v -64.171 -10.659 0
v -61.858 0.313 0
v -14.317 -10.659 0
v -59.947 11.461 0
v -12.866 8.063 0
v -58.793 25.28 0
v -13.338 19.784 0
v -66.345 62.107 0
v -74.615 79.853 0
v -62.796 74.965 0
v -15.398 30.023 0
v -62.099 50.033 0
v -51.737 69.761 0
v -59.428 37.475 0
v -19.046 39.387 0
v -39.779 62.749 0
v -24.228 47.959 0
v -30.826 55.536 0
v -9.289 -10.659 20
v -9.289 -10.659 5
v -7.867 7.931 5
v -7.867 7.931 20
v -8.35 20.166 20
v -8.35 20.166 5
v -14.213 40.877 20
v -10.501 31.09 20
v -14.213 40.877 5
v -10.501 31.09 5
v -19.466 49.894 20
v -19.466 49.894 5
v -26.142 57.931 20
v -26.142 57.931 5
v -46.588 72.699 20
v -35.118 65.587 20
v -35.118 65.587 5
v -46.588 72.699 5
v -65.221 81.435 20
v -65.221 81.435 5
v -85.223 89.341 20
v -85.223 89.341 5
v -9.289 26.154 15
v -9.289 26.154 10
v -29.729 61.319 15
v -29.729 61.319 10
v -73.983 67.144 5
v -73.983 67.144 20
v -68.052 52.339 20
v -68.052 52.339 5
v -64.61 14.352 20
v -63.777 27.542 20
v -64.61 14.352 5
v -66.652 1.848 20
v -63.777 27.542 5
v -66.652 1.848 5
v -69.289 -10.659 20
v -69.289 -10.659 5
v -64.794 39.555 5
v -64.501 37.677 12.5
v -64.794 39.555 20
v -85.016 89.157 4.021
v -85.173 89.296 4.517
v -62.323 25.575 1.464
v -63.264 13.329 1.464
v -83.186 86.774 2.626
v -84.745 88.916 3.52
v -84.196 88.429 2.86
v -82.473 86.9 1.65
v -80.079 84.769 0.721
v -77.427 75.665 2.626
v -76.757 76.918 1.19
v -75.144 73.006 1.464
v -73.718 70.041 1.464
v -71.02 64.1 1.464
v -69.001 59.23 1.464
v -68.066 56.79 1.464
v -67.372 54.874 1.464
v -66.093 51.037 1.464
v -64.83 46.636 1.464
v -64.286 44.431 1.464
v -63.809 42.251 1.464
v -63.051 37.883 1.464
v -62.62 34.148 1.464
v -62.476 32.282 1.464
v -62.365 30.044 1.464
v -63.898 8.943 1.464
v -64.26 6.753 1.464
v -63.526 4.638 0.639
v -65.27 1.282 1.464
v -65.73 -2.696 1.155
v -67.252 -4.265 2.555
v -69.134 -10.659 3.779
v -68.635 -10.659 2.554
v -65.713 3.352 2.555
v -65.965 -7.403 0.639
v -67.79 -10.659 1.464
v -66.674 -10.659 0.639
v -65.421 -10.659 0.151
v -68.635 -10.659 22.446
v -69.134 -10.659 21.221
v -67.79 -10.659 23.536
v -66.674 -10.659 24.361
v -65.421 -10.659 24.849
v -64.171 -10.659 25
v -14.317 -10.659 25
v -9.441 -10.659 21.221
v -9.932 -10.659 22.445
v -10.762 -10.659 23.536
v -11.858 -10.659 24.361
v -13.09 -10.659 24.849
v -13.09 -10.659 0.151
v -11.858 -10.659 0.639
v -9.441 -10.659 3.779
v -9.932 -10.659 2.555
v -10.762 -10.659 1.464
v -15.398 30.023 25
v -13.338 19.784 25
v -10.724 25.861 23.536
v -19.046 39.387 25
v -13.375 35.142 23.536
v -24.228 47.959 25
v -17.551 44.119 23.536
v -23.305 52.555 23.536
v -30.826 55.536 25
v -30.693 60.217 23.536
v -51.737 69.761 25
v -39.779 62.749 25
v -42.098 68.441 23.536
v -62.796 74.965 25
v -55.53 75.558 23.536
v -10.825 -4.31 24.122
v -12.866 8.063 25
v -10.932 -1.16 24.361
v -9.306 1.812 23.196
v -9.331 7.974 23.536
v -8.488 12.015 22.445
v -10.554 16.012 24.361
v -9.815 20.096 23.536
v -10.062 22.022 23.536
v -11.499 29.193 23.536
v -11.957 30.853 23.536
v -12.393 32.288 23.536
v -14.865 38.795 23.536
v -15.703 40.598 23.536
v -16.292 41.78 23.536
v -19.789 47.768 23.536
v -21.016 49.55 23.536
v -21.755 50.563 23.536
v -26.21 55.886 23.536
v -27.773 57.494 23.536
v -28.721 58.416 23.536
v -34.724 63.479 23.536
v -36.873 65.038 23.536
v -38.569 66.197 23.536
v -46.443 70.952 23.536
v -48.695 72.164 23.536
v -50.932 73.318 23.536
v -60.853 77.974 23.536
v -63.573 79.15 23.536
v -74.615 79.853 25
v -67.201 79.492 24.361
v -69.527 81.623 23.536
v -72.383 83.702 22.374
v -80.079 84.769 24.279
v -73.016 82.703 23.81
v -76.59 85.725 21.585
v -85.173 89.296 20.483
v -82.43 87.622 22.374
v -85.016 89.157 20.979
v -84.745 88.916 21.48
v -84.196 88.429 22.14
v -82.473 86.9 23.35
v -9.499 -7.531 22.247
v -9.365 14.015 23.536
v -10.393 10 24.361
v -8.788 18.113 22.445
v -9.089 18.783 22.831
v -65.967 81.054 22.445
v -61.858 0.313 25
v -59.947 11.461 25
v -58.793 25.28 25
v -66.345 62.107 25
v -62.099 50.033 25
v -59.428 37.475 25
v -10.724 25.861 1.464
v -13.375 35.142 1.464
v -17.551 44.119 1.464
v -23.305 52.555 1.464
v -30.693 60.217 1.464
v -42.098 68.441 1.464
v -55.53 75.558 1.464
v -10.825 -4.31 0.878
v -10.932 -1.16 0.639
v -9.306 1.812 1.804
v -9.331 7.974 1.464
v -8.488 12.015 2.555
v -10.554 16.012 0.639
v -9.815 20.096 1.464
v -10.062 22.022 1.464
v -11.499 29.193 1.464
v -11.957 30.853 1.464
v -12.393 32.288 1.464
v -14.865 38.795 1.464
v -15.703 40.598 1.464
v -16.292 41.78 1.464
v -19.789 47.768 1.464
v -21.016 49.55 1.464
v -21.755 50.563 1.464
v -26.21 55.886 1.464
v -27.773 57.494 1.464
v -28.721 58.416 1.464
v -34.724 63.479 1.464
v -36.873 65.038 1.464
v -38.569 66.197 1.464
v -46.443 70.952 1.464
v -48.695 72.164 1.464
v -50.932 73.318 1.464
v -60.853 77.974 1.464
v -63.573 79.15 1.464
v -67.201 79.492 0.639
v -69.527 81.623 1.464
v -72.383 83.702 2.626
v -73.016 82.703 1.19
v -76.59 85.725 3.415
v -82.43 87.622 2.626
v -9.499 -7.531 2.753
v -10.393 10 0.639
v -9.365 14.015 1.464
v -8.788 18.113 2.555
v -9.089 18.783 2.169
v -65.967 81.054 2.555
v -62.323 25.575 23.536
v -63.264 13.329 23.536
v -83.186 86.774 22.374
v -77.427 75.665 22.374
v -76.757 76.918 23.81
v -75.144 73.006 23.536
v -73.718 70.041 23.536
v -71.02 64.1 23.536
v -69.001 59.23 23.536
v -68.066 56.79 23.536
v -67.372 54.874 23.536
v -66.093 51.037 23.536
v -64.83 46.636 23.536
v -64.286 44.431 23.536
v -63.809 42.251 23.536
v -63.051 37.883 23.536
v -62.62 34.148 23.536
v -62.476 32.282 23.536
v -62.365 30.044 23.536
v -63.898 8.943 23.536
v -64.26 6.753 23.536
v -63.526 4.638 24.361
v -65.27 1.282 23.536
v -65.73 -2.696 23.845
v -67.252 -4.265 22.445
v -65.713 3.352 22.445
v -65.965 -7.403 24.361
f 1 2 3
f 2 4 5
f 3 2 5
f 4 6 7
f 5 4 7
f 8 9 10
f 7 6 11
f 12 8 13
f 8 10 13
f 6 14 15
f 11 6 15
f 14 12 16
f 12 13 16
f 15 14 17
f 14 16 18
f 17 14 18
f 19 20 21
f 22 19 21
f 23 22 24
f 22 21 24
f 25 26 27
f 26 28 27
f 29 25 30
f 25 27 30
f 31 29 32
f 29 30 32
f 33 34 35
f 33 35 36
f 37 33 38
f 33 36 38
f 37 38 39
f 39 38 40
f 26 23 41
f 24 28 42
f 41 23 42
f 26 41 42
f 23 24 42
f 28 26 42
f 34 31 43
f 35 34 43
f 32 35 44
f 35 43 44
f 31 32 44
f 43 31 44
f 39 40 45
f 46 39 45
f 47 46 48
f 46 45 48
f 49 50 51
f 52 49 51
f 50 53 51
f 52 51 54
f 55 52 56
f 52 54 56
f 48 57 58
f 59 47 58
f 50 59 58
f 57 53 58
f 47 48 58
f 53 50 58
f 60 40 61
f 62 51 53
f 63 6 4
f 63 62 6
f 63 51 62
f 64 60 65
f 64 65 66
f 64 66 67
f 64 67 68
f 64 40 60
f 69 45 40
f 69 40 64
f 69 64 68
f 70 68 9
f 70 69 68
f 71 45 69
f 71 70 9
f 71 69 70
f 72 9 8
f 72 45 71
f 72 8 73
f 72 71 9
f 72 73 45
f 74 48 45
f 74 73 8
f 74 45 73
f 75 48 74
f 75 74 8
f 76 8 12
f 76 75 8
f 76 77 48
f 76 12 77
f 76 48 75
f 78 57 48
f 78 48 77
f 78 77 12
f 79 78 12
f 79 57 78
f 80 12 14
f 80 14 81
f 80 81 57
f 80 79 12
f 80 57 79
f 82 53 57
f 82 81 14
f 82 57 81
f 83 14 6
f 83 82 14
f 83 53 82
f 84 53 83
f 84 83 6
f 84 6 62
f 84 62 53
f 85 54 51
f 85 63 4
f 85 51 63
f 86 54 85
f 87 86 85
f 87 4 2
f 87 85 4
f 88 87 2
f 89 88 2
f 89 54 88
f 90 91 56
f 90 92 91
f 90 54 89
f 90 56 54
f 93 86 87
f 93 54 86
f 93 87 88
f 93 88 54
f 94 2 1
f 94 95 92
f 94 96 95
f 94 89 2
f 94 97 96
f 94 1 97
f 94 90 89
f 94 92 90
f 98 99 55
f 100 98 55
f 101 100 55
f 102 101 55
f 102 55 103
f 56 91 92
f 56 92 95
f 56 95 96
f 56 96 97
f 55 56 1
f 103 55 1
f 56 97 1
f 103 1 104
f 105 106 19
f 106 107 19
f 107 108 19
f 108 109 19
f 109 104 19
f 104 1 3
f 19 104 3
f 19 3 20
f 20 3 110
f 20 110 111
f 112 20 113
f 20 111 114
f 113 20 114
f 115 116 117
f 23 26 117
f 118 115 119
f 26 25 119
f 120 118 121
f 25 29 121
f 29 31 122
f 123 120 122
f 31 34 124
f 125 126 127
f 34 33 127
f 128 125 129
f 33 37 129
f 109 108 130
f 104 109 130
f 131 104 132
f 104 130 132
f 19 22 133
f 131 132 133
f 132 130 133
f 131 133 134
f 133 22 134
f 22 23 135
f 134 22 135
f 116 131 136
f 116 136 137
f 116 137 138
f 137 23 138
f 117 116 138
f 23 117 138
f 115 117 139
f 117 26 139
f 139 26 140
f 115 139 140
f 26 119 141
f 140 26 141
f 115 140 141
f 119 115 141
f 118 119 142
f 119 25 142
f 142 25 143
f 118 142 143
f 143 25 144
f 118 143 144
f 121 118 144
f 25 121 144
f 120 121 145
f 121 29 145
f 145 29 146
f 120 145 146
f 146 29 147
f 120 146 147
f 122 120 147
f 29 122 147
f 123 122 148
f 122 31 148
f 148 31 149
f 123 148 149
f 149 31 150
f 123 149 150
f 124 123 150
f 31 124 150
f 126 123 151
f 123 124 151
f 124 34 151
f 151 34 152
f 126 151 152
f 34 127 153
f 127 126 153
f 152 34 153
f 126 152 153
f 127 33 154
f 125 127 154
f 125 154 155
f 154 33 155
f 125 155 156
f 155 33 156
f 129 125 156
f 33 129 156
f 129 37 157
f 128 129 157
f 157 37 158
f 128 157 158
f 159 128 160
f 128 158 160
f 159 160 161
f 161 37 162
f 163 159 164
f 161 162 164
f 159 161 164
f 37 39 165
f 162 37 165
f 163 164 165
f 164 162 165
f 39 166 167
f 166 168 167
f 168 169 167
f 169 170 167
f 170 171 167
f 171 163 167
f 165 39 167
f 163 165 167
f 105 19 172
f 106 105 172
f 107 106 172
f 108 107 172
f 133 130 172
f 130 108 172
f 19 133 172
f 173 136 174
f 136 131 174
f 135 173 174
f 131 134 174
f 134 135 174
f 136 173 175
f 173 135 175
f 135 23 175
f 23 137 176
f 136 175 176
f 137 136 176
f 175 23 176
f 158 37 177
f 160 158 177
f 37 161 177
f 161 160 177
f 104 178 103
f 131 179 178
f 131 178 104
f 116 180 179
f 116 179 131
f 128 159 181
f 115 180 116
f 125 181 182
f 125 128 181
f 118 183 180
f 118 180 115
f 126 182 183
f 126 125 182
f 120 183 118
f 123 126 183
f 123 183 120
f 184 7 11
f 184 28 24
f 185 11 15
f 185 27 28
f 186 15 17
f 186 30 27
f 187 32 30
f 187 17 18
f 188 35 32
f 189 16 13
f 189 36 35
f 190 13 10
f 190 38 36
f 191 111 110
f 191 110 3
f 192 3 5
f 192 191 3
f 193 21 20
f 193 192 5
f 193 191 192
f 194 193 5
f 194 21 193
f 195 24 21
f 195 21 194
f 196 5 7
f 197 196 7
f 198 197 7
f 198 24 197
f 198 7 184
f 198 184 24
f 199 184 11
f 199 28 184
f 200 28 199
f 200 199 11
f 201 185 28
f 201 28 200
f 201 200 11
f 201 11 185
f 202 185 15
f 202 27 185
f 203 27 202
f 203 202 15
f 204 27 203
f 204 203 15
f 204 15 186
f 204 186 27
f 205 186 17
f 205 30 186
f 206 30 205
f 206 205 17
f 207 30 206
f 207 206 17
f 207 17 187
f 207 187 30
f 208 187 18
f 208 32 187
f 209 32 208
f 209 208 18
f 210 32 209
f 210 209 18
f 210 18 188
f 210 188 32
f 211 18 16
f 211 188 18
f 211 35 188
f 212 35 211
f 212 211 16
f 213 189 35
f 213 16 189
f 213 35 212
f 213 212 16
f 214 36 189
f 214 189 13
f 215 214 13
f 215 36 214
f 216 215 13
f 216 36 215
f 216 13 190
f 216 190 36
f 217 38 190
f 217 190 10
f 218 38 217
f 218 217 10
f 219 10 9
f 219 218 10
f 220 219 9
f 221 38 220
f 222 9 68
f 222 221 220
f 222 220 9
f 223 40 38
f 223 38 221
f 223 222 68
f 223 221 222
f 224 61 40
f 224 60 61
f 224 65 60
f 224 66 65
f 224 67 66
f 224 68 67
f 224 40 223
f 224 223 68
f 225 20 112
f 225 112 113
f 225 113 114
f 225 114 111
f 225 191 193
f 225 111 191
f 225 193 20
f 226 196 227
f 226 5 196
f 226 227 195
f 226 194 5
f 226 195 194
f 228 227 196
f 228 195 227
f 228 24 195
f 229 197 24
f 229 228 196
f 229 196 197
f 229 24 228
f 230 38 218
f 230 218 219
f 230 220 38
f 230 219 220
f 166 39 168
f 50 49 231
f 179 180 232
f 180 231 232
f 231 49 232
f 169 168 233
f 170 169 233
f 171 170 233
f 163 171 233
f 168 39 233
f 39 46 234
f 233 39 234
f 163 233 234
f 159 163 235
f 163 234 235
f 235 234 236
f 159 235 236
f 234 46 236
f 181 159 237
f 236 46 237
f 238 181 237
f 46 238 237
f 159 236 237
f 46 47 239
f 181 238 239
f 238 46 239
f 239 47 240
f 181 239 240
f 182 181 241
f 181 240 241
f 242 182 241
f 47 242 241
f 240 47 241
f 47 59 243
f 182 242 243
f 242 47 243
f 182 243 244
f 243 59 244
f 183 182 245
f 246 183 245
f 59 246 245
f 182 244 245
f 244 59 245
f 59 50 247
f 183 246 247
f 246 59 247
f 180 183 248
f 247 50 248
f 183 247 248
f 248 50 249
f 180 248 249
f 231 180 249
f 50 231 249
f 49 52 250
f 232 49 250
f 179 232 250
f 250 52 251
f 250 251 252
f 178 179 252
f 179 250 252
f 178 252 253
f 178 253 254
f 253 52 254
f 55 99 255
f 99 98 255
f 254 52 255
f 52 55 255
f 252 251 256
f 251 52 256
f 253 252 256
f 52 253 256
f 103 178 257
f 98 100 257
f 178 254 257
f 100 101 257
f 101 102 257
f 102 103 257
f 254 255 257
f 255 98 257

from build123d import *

# Parameters (mm, degrees)
F1_DEPTH = 25
F2_R     = 5


with BuildPart() as f1:
    # F0 (on Top) → F1 (new body)
    with BuildSketch(Plane.XY):
        with BuildLine():
            add(Edge.make_bspline(
                [(-85.2232245209, 89.3407093361), (-76.1078356744, 72.1294474685), (-58.4008853366, 38.8287239467), (-65.7688178685, 5.4617543863), (-69.2891548347, -10.6592906639)],
                knots=[0, 0, 0, 0, 0.5170291798, 1, 1, 1, 1], degree=3))
            Line((-69.2891548347, -10.6592906639), (-9.2891548347, -10.6592906639))
            add(Edge.make_bspline(
                [(-9.2891548347, -10.6592906639), (-7.9778926841, 1.7168816499), (-5.5924427944, 26.9387503571), (-26.6930073641, 67.0668752818), (-64.5008126009, 81.3490670792), (-85.2232245209, 89.3407093361)],
                knots=[0, 0, 0, 0, 0.2984501918, 0.6121588163, 1, 1, 1, 1], degree=3))
        make_face()
    extrude(amount=F1_DEPTH)

    # F2
    f2_edges = [f1.edges().sort_by_distance(p)[0] for p in [
        (-24.084817, 55.731456, 0),
        (-24.084817, 55.731456, 25),
        (-65.088817, 41.176691, 25),
        (-65.088817, 41.176691, 0),
    ]]
    fillet(f2_edges, radius=F2_R)


solid = f1.part
